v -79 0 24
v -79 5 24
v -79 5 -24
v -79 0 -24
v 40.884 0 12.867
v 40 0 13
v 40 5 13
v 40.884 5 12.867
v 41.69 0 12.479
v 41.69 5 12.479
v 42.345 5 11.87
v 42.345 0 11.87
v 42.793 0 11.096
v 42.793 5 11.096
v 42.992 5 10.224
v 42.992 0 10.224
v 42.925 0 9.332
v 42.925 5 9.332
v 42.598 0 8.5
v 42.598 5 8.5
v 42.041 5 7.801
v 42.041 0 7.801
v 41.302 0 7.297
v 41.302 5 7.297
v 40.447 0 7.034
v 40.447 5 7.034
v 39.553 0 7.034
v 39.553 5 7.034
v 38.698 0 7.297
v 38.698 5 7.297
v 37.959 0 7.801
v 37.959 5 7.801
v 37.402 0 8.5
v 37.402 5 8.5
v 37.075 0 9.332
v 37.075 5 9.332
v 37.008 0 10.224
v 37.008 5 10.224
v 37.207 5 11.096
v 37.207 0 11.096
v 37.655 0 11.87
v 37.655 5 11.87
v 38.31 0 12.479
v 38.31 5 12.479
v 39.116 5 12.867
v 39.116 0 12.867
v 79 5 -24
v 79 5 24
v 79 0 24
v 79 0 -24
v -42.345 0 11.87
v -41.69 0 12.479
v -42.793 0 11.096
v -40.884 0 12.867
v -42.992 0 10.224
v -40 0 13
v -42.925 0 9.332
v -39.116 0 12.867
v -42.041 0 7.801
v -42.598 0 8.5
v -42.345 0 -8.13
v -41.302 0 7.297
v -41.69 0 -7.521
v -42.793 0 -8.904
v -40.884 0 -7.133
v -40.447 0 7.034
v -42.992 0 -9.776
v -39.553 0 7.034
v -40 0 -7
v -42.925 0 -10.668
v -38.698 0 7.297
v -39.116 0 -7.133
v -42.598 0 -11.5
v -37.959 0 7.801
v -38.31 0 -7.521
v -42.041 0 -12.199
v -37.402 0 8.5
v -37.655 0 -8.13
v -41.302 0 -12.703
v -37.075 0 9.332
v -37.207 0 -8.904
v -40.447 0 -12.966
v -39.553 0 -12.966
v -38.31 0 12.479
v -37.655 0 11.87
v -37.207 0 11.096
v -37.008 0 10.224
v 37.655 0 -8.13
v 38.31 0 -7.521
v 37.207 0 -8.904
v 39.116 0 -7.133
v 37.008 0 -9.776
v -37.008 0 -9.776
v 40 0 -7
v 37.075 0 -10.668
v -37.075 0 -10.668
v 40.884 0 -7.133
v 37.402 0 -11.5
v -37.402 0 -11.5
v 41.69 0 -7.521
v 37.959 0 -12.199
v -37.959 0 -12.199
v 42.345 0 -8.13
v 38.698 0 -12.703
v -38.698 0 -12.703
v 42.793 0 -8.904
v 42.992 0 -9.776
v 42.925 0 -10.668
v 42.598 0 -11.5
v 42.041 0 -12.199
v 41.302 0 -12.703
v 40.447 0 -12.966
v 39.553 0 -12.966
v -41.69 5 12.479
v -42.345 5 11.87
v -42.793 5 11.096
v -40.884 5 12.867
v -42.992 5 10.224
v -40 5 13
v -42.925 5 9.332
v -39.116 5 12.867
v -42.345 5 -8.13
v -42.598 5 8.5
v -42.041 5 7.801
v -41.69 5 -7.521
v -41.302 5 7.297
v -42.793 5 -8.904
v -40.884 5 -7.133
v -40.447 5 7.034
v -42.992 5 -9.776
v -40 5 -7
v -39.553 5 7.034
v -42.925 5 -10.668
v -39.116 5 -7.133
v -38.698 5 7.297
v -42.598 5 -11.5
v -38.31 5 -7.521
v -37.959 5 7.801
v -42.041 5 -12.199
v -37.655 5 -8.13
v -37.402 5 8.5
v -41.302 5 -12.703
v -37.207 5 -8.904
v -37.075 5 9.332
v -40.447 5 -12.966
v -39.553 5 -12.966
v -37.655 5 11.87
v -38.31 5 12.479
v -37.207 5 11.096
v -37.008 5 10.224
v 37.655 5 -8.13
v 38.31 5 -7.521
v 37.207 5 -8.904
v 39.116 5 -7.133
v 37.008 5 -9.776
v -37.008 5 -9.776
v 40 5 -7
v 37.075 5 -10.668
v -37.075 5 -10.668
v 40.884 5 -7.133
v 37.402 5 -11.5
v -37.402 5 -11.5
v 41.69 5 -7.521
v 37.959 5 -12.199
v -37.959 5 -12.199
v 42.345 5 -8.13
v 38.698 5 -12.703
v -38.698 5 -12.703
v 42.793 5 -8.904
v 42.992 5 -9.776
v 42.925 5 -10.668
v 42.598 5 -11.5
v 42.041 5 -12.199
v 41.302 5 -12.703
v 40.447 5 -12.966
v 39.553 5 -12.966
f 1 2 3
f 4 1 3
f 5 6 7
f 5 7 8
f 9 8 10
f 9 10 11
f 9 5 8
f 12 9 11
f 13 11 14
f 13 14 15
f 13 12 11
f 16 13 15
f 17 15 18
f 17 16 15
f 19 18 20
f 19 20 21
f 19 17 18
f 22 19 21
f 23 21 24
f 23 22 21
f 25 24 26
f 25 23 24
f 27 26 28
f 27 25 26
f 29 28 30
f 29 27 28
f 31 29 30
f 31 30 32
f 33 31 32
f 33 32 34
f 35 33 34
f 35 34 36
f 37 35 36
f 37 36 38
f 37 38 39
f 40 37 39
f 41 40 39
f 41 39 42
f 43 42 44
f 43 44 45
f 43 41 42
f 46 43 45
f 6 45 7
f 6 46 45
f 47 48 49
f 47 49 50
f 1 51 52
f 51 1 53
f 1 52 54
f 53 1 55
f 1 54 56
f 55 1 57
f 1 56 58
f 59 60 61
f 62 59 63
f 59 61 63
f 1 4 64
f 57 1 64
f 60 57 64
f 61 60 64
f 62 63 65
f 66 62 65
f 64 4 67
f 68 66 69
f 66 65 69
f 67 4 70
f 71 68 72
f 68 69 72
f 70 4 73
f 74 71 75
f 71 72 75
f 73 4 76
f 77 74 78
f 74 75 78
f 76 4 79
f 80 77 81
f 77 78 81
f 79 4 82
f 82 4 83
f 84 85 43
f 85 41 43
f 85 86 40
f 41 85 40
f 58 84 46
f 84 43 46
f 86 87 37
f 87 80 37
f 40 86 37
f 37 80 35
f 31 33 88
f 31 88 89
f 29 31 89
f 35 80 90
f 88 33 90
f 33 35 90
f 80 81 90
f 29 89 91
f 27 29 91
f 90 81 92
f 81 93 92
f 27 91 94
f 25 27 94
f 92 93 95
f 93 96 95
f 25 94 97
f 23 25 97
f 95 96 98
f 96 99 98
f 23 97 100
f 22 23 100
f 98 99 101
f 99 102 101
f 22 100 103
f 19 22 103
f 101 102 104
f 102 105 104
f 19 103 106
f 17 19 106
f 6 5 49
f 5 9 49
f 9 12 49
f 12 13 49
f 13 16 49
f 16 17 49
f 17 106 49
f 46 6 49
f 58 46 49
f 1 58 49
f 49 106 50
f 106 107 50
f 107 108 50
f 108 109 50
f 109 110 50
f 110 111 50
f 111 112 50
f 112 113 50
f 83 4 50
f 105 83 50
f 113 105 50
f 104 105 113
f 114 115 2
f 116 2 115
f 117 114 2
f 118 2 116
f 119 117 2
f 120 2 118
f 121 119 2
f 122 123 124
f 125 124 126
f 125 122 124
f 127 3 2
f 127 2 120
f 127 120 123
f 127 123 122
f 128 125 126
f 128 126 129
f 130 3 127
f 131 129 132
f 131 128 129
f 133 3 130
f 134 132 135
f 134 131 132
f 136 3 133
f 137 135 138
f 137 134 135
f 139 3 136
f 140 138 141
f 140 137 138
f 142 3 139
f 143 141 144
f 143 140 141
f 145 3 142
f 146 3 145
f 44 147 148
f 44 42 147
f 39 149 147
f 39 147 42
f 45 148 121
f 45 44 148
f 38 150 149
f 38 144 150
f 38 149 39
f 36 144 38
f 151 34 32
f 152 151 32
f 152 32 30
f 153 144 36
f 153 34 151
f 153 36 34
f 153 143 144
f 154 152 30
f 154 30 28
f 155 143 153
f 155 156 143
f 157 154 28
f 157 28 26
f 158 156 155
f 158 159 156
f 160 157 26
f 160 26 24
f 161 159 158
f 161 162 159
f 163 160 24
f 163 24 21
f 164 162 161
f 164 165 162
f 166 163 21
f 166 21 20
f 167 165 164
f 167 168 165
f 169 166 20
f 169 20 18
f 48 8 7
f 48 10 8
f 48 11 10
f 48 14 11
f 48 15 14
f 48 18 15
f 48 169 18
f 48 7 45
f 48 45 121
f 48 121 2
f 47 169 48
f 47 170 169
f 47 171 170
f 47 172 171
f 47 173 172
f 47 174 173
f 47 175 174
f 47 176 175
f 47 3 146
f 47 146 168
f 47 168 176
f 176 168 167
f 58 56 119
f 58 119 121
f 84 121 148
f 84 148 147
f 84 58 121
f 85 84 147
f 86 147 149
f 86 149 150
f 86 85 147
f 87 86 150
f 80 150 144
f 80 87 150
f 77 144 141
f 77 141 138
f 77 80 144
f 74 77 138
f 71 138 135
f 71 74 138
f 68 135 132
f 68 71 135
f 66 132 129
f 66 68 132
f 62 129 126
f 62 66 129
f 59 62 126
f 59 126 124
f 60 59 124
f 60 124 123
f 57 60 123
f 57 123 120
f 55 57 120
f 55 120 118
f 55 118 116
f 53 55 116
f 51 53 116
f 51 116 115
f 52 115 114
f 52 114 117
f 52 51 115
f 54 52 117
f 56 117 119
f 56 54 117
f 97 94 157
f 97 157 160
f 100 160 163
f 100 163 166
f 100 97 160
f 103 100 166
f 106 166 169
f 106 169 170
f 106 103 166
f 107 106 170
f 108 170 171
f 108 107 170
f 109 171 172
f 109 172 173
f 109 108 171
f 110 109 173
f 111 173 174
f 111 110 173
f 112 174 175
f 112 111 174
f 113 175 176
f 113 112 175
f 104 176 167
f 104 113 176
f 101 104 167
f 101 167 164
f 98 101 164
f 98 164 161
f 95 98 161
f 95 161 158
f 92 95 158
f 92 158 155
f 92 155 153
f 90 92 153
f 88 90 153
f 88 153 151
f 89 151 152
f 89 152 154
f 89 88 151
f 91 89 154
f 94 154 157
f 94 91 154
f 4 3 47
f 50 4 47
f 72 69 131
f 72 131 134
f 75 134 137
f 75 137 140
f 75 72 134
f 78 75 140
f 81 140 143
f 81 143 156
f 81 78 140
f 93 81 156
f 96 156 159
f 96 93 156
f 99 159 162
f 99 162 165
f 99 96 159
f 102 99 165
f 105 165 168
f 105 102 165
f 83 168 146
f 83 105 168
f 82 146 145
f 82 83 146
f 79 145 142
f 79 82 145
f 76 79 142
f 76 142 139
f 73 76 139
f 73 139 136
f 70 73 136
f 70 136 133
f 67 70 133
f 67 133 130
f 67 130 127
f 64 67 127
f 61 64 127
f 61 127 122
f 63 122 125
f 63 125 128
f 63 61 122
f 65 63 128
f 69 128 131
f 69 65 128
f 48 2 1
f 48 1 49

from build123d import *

# Parameters (mm, degrees)
SKIZZE1_W                       = 160
SKIZZE1_H                       = 50
SKIZZE1_R                       = 3
AUFSATZ_LINEAR_AUSTRAGEN1_DEPTH = 5
SKIZZE2_W                       = 160
SKIZZE2_H                       = 50
SKIZZE2_W_2                     = 158
SKIZZE2_H_2                     = 48
SCHNITT_LINEAR_AUSTRAGEN1_DEPTH = 10


with BuildPart() as part:
    # Skizze1 → Aufsatz-Linear austragen1 (new body)
    with BuildSketch(Plane(origin=(0, 0, 0), x_dir=(1, 0, 0), z_dir=(0, 1, 0))):
        Rectangle(SKIZZE1_W, SKIZZE1_H)
        with Locations(Location((-40, 10, 0), (0, 0, 270))):
            Circle(SKIZZE1_R, mode=Mode.SUBTRACT)
        with Locations(Location((-40, -10, 0), (0, 0, 270))):
            Circle(SKIZZE1_R, mode=Mode.SUBTRACT)
        with Locations(Location((40, 10, 0), (0, 0, 270))):
            Circle(SKIZZE1_R, mode=Mode.SUBTRACT)
        with Locations(Location((40, -10, 0), (0, 0, 270))):
            Circle(SKIZZE1_R, mode=Mode.SUBTRACT)
    extrude(amount=AUFSATZ_LINEAR_AUSTRAGEN1_DEPTH)

    # Skizze2 → Schnitt-Linear austragen1 (cut)
    with BuildSketch(Plane(origin=(0, 5, 0), x_dir=(1, 0, 0), z_dir=(0, 1, 0))):
        Rectangle(SKIZZE2_W, SKIZZE2_H)
        Rectangle(SKIZZE2_W_2, SKIZZE2_H_2, mode=Mode.SUBTRACT)
    extrude(amount=-SCHNITT_LINEAR_AUSTRAGEN1_DEPTH, mode=Mode.SUBTRACT)


solid = part.part
